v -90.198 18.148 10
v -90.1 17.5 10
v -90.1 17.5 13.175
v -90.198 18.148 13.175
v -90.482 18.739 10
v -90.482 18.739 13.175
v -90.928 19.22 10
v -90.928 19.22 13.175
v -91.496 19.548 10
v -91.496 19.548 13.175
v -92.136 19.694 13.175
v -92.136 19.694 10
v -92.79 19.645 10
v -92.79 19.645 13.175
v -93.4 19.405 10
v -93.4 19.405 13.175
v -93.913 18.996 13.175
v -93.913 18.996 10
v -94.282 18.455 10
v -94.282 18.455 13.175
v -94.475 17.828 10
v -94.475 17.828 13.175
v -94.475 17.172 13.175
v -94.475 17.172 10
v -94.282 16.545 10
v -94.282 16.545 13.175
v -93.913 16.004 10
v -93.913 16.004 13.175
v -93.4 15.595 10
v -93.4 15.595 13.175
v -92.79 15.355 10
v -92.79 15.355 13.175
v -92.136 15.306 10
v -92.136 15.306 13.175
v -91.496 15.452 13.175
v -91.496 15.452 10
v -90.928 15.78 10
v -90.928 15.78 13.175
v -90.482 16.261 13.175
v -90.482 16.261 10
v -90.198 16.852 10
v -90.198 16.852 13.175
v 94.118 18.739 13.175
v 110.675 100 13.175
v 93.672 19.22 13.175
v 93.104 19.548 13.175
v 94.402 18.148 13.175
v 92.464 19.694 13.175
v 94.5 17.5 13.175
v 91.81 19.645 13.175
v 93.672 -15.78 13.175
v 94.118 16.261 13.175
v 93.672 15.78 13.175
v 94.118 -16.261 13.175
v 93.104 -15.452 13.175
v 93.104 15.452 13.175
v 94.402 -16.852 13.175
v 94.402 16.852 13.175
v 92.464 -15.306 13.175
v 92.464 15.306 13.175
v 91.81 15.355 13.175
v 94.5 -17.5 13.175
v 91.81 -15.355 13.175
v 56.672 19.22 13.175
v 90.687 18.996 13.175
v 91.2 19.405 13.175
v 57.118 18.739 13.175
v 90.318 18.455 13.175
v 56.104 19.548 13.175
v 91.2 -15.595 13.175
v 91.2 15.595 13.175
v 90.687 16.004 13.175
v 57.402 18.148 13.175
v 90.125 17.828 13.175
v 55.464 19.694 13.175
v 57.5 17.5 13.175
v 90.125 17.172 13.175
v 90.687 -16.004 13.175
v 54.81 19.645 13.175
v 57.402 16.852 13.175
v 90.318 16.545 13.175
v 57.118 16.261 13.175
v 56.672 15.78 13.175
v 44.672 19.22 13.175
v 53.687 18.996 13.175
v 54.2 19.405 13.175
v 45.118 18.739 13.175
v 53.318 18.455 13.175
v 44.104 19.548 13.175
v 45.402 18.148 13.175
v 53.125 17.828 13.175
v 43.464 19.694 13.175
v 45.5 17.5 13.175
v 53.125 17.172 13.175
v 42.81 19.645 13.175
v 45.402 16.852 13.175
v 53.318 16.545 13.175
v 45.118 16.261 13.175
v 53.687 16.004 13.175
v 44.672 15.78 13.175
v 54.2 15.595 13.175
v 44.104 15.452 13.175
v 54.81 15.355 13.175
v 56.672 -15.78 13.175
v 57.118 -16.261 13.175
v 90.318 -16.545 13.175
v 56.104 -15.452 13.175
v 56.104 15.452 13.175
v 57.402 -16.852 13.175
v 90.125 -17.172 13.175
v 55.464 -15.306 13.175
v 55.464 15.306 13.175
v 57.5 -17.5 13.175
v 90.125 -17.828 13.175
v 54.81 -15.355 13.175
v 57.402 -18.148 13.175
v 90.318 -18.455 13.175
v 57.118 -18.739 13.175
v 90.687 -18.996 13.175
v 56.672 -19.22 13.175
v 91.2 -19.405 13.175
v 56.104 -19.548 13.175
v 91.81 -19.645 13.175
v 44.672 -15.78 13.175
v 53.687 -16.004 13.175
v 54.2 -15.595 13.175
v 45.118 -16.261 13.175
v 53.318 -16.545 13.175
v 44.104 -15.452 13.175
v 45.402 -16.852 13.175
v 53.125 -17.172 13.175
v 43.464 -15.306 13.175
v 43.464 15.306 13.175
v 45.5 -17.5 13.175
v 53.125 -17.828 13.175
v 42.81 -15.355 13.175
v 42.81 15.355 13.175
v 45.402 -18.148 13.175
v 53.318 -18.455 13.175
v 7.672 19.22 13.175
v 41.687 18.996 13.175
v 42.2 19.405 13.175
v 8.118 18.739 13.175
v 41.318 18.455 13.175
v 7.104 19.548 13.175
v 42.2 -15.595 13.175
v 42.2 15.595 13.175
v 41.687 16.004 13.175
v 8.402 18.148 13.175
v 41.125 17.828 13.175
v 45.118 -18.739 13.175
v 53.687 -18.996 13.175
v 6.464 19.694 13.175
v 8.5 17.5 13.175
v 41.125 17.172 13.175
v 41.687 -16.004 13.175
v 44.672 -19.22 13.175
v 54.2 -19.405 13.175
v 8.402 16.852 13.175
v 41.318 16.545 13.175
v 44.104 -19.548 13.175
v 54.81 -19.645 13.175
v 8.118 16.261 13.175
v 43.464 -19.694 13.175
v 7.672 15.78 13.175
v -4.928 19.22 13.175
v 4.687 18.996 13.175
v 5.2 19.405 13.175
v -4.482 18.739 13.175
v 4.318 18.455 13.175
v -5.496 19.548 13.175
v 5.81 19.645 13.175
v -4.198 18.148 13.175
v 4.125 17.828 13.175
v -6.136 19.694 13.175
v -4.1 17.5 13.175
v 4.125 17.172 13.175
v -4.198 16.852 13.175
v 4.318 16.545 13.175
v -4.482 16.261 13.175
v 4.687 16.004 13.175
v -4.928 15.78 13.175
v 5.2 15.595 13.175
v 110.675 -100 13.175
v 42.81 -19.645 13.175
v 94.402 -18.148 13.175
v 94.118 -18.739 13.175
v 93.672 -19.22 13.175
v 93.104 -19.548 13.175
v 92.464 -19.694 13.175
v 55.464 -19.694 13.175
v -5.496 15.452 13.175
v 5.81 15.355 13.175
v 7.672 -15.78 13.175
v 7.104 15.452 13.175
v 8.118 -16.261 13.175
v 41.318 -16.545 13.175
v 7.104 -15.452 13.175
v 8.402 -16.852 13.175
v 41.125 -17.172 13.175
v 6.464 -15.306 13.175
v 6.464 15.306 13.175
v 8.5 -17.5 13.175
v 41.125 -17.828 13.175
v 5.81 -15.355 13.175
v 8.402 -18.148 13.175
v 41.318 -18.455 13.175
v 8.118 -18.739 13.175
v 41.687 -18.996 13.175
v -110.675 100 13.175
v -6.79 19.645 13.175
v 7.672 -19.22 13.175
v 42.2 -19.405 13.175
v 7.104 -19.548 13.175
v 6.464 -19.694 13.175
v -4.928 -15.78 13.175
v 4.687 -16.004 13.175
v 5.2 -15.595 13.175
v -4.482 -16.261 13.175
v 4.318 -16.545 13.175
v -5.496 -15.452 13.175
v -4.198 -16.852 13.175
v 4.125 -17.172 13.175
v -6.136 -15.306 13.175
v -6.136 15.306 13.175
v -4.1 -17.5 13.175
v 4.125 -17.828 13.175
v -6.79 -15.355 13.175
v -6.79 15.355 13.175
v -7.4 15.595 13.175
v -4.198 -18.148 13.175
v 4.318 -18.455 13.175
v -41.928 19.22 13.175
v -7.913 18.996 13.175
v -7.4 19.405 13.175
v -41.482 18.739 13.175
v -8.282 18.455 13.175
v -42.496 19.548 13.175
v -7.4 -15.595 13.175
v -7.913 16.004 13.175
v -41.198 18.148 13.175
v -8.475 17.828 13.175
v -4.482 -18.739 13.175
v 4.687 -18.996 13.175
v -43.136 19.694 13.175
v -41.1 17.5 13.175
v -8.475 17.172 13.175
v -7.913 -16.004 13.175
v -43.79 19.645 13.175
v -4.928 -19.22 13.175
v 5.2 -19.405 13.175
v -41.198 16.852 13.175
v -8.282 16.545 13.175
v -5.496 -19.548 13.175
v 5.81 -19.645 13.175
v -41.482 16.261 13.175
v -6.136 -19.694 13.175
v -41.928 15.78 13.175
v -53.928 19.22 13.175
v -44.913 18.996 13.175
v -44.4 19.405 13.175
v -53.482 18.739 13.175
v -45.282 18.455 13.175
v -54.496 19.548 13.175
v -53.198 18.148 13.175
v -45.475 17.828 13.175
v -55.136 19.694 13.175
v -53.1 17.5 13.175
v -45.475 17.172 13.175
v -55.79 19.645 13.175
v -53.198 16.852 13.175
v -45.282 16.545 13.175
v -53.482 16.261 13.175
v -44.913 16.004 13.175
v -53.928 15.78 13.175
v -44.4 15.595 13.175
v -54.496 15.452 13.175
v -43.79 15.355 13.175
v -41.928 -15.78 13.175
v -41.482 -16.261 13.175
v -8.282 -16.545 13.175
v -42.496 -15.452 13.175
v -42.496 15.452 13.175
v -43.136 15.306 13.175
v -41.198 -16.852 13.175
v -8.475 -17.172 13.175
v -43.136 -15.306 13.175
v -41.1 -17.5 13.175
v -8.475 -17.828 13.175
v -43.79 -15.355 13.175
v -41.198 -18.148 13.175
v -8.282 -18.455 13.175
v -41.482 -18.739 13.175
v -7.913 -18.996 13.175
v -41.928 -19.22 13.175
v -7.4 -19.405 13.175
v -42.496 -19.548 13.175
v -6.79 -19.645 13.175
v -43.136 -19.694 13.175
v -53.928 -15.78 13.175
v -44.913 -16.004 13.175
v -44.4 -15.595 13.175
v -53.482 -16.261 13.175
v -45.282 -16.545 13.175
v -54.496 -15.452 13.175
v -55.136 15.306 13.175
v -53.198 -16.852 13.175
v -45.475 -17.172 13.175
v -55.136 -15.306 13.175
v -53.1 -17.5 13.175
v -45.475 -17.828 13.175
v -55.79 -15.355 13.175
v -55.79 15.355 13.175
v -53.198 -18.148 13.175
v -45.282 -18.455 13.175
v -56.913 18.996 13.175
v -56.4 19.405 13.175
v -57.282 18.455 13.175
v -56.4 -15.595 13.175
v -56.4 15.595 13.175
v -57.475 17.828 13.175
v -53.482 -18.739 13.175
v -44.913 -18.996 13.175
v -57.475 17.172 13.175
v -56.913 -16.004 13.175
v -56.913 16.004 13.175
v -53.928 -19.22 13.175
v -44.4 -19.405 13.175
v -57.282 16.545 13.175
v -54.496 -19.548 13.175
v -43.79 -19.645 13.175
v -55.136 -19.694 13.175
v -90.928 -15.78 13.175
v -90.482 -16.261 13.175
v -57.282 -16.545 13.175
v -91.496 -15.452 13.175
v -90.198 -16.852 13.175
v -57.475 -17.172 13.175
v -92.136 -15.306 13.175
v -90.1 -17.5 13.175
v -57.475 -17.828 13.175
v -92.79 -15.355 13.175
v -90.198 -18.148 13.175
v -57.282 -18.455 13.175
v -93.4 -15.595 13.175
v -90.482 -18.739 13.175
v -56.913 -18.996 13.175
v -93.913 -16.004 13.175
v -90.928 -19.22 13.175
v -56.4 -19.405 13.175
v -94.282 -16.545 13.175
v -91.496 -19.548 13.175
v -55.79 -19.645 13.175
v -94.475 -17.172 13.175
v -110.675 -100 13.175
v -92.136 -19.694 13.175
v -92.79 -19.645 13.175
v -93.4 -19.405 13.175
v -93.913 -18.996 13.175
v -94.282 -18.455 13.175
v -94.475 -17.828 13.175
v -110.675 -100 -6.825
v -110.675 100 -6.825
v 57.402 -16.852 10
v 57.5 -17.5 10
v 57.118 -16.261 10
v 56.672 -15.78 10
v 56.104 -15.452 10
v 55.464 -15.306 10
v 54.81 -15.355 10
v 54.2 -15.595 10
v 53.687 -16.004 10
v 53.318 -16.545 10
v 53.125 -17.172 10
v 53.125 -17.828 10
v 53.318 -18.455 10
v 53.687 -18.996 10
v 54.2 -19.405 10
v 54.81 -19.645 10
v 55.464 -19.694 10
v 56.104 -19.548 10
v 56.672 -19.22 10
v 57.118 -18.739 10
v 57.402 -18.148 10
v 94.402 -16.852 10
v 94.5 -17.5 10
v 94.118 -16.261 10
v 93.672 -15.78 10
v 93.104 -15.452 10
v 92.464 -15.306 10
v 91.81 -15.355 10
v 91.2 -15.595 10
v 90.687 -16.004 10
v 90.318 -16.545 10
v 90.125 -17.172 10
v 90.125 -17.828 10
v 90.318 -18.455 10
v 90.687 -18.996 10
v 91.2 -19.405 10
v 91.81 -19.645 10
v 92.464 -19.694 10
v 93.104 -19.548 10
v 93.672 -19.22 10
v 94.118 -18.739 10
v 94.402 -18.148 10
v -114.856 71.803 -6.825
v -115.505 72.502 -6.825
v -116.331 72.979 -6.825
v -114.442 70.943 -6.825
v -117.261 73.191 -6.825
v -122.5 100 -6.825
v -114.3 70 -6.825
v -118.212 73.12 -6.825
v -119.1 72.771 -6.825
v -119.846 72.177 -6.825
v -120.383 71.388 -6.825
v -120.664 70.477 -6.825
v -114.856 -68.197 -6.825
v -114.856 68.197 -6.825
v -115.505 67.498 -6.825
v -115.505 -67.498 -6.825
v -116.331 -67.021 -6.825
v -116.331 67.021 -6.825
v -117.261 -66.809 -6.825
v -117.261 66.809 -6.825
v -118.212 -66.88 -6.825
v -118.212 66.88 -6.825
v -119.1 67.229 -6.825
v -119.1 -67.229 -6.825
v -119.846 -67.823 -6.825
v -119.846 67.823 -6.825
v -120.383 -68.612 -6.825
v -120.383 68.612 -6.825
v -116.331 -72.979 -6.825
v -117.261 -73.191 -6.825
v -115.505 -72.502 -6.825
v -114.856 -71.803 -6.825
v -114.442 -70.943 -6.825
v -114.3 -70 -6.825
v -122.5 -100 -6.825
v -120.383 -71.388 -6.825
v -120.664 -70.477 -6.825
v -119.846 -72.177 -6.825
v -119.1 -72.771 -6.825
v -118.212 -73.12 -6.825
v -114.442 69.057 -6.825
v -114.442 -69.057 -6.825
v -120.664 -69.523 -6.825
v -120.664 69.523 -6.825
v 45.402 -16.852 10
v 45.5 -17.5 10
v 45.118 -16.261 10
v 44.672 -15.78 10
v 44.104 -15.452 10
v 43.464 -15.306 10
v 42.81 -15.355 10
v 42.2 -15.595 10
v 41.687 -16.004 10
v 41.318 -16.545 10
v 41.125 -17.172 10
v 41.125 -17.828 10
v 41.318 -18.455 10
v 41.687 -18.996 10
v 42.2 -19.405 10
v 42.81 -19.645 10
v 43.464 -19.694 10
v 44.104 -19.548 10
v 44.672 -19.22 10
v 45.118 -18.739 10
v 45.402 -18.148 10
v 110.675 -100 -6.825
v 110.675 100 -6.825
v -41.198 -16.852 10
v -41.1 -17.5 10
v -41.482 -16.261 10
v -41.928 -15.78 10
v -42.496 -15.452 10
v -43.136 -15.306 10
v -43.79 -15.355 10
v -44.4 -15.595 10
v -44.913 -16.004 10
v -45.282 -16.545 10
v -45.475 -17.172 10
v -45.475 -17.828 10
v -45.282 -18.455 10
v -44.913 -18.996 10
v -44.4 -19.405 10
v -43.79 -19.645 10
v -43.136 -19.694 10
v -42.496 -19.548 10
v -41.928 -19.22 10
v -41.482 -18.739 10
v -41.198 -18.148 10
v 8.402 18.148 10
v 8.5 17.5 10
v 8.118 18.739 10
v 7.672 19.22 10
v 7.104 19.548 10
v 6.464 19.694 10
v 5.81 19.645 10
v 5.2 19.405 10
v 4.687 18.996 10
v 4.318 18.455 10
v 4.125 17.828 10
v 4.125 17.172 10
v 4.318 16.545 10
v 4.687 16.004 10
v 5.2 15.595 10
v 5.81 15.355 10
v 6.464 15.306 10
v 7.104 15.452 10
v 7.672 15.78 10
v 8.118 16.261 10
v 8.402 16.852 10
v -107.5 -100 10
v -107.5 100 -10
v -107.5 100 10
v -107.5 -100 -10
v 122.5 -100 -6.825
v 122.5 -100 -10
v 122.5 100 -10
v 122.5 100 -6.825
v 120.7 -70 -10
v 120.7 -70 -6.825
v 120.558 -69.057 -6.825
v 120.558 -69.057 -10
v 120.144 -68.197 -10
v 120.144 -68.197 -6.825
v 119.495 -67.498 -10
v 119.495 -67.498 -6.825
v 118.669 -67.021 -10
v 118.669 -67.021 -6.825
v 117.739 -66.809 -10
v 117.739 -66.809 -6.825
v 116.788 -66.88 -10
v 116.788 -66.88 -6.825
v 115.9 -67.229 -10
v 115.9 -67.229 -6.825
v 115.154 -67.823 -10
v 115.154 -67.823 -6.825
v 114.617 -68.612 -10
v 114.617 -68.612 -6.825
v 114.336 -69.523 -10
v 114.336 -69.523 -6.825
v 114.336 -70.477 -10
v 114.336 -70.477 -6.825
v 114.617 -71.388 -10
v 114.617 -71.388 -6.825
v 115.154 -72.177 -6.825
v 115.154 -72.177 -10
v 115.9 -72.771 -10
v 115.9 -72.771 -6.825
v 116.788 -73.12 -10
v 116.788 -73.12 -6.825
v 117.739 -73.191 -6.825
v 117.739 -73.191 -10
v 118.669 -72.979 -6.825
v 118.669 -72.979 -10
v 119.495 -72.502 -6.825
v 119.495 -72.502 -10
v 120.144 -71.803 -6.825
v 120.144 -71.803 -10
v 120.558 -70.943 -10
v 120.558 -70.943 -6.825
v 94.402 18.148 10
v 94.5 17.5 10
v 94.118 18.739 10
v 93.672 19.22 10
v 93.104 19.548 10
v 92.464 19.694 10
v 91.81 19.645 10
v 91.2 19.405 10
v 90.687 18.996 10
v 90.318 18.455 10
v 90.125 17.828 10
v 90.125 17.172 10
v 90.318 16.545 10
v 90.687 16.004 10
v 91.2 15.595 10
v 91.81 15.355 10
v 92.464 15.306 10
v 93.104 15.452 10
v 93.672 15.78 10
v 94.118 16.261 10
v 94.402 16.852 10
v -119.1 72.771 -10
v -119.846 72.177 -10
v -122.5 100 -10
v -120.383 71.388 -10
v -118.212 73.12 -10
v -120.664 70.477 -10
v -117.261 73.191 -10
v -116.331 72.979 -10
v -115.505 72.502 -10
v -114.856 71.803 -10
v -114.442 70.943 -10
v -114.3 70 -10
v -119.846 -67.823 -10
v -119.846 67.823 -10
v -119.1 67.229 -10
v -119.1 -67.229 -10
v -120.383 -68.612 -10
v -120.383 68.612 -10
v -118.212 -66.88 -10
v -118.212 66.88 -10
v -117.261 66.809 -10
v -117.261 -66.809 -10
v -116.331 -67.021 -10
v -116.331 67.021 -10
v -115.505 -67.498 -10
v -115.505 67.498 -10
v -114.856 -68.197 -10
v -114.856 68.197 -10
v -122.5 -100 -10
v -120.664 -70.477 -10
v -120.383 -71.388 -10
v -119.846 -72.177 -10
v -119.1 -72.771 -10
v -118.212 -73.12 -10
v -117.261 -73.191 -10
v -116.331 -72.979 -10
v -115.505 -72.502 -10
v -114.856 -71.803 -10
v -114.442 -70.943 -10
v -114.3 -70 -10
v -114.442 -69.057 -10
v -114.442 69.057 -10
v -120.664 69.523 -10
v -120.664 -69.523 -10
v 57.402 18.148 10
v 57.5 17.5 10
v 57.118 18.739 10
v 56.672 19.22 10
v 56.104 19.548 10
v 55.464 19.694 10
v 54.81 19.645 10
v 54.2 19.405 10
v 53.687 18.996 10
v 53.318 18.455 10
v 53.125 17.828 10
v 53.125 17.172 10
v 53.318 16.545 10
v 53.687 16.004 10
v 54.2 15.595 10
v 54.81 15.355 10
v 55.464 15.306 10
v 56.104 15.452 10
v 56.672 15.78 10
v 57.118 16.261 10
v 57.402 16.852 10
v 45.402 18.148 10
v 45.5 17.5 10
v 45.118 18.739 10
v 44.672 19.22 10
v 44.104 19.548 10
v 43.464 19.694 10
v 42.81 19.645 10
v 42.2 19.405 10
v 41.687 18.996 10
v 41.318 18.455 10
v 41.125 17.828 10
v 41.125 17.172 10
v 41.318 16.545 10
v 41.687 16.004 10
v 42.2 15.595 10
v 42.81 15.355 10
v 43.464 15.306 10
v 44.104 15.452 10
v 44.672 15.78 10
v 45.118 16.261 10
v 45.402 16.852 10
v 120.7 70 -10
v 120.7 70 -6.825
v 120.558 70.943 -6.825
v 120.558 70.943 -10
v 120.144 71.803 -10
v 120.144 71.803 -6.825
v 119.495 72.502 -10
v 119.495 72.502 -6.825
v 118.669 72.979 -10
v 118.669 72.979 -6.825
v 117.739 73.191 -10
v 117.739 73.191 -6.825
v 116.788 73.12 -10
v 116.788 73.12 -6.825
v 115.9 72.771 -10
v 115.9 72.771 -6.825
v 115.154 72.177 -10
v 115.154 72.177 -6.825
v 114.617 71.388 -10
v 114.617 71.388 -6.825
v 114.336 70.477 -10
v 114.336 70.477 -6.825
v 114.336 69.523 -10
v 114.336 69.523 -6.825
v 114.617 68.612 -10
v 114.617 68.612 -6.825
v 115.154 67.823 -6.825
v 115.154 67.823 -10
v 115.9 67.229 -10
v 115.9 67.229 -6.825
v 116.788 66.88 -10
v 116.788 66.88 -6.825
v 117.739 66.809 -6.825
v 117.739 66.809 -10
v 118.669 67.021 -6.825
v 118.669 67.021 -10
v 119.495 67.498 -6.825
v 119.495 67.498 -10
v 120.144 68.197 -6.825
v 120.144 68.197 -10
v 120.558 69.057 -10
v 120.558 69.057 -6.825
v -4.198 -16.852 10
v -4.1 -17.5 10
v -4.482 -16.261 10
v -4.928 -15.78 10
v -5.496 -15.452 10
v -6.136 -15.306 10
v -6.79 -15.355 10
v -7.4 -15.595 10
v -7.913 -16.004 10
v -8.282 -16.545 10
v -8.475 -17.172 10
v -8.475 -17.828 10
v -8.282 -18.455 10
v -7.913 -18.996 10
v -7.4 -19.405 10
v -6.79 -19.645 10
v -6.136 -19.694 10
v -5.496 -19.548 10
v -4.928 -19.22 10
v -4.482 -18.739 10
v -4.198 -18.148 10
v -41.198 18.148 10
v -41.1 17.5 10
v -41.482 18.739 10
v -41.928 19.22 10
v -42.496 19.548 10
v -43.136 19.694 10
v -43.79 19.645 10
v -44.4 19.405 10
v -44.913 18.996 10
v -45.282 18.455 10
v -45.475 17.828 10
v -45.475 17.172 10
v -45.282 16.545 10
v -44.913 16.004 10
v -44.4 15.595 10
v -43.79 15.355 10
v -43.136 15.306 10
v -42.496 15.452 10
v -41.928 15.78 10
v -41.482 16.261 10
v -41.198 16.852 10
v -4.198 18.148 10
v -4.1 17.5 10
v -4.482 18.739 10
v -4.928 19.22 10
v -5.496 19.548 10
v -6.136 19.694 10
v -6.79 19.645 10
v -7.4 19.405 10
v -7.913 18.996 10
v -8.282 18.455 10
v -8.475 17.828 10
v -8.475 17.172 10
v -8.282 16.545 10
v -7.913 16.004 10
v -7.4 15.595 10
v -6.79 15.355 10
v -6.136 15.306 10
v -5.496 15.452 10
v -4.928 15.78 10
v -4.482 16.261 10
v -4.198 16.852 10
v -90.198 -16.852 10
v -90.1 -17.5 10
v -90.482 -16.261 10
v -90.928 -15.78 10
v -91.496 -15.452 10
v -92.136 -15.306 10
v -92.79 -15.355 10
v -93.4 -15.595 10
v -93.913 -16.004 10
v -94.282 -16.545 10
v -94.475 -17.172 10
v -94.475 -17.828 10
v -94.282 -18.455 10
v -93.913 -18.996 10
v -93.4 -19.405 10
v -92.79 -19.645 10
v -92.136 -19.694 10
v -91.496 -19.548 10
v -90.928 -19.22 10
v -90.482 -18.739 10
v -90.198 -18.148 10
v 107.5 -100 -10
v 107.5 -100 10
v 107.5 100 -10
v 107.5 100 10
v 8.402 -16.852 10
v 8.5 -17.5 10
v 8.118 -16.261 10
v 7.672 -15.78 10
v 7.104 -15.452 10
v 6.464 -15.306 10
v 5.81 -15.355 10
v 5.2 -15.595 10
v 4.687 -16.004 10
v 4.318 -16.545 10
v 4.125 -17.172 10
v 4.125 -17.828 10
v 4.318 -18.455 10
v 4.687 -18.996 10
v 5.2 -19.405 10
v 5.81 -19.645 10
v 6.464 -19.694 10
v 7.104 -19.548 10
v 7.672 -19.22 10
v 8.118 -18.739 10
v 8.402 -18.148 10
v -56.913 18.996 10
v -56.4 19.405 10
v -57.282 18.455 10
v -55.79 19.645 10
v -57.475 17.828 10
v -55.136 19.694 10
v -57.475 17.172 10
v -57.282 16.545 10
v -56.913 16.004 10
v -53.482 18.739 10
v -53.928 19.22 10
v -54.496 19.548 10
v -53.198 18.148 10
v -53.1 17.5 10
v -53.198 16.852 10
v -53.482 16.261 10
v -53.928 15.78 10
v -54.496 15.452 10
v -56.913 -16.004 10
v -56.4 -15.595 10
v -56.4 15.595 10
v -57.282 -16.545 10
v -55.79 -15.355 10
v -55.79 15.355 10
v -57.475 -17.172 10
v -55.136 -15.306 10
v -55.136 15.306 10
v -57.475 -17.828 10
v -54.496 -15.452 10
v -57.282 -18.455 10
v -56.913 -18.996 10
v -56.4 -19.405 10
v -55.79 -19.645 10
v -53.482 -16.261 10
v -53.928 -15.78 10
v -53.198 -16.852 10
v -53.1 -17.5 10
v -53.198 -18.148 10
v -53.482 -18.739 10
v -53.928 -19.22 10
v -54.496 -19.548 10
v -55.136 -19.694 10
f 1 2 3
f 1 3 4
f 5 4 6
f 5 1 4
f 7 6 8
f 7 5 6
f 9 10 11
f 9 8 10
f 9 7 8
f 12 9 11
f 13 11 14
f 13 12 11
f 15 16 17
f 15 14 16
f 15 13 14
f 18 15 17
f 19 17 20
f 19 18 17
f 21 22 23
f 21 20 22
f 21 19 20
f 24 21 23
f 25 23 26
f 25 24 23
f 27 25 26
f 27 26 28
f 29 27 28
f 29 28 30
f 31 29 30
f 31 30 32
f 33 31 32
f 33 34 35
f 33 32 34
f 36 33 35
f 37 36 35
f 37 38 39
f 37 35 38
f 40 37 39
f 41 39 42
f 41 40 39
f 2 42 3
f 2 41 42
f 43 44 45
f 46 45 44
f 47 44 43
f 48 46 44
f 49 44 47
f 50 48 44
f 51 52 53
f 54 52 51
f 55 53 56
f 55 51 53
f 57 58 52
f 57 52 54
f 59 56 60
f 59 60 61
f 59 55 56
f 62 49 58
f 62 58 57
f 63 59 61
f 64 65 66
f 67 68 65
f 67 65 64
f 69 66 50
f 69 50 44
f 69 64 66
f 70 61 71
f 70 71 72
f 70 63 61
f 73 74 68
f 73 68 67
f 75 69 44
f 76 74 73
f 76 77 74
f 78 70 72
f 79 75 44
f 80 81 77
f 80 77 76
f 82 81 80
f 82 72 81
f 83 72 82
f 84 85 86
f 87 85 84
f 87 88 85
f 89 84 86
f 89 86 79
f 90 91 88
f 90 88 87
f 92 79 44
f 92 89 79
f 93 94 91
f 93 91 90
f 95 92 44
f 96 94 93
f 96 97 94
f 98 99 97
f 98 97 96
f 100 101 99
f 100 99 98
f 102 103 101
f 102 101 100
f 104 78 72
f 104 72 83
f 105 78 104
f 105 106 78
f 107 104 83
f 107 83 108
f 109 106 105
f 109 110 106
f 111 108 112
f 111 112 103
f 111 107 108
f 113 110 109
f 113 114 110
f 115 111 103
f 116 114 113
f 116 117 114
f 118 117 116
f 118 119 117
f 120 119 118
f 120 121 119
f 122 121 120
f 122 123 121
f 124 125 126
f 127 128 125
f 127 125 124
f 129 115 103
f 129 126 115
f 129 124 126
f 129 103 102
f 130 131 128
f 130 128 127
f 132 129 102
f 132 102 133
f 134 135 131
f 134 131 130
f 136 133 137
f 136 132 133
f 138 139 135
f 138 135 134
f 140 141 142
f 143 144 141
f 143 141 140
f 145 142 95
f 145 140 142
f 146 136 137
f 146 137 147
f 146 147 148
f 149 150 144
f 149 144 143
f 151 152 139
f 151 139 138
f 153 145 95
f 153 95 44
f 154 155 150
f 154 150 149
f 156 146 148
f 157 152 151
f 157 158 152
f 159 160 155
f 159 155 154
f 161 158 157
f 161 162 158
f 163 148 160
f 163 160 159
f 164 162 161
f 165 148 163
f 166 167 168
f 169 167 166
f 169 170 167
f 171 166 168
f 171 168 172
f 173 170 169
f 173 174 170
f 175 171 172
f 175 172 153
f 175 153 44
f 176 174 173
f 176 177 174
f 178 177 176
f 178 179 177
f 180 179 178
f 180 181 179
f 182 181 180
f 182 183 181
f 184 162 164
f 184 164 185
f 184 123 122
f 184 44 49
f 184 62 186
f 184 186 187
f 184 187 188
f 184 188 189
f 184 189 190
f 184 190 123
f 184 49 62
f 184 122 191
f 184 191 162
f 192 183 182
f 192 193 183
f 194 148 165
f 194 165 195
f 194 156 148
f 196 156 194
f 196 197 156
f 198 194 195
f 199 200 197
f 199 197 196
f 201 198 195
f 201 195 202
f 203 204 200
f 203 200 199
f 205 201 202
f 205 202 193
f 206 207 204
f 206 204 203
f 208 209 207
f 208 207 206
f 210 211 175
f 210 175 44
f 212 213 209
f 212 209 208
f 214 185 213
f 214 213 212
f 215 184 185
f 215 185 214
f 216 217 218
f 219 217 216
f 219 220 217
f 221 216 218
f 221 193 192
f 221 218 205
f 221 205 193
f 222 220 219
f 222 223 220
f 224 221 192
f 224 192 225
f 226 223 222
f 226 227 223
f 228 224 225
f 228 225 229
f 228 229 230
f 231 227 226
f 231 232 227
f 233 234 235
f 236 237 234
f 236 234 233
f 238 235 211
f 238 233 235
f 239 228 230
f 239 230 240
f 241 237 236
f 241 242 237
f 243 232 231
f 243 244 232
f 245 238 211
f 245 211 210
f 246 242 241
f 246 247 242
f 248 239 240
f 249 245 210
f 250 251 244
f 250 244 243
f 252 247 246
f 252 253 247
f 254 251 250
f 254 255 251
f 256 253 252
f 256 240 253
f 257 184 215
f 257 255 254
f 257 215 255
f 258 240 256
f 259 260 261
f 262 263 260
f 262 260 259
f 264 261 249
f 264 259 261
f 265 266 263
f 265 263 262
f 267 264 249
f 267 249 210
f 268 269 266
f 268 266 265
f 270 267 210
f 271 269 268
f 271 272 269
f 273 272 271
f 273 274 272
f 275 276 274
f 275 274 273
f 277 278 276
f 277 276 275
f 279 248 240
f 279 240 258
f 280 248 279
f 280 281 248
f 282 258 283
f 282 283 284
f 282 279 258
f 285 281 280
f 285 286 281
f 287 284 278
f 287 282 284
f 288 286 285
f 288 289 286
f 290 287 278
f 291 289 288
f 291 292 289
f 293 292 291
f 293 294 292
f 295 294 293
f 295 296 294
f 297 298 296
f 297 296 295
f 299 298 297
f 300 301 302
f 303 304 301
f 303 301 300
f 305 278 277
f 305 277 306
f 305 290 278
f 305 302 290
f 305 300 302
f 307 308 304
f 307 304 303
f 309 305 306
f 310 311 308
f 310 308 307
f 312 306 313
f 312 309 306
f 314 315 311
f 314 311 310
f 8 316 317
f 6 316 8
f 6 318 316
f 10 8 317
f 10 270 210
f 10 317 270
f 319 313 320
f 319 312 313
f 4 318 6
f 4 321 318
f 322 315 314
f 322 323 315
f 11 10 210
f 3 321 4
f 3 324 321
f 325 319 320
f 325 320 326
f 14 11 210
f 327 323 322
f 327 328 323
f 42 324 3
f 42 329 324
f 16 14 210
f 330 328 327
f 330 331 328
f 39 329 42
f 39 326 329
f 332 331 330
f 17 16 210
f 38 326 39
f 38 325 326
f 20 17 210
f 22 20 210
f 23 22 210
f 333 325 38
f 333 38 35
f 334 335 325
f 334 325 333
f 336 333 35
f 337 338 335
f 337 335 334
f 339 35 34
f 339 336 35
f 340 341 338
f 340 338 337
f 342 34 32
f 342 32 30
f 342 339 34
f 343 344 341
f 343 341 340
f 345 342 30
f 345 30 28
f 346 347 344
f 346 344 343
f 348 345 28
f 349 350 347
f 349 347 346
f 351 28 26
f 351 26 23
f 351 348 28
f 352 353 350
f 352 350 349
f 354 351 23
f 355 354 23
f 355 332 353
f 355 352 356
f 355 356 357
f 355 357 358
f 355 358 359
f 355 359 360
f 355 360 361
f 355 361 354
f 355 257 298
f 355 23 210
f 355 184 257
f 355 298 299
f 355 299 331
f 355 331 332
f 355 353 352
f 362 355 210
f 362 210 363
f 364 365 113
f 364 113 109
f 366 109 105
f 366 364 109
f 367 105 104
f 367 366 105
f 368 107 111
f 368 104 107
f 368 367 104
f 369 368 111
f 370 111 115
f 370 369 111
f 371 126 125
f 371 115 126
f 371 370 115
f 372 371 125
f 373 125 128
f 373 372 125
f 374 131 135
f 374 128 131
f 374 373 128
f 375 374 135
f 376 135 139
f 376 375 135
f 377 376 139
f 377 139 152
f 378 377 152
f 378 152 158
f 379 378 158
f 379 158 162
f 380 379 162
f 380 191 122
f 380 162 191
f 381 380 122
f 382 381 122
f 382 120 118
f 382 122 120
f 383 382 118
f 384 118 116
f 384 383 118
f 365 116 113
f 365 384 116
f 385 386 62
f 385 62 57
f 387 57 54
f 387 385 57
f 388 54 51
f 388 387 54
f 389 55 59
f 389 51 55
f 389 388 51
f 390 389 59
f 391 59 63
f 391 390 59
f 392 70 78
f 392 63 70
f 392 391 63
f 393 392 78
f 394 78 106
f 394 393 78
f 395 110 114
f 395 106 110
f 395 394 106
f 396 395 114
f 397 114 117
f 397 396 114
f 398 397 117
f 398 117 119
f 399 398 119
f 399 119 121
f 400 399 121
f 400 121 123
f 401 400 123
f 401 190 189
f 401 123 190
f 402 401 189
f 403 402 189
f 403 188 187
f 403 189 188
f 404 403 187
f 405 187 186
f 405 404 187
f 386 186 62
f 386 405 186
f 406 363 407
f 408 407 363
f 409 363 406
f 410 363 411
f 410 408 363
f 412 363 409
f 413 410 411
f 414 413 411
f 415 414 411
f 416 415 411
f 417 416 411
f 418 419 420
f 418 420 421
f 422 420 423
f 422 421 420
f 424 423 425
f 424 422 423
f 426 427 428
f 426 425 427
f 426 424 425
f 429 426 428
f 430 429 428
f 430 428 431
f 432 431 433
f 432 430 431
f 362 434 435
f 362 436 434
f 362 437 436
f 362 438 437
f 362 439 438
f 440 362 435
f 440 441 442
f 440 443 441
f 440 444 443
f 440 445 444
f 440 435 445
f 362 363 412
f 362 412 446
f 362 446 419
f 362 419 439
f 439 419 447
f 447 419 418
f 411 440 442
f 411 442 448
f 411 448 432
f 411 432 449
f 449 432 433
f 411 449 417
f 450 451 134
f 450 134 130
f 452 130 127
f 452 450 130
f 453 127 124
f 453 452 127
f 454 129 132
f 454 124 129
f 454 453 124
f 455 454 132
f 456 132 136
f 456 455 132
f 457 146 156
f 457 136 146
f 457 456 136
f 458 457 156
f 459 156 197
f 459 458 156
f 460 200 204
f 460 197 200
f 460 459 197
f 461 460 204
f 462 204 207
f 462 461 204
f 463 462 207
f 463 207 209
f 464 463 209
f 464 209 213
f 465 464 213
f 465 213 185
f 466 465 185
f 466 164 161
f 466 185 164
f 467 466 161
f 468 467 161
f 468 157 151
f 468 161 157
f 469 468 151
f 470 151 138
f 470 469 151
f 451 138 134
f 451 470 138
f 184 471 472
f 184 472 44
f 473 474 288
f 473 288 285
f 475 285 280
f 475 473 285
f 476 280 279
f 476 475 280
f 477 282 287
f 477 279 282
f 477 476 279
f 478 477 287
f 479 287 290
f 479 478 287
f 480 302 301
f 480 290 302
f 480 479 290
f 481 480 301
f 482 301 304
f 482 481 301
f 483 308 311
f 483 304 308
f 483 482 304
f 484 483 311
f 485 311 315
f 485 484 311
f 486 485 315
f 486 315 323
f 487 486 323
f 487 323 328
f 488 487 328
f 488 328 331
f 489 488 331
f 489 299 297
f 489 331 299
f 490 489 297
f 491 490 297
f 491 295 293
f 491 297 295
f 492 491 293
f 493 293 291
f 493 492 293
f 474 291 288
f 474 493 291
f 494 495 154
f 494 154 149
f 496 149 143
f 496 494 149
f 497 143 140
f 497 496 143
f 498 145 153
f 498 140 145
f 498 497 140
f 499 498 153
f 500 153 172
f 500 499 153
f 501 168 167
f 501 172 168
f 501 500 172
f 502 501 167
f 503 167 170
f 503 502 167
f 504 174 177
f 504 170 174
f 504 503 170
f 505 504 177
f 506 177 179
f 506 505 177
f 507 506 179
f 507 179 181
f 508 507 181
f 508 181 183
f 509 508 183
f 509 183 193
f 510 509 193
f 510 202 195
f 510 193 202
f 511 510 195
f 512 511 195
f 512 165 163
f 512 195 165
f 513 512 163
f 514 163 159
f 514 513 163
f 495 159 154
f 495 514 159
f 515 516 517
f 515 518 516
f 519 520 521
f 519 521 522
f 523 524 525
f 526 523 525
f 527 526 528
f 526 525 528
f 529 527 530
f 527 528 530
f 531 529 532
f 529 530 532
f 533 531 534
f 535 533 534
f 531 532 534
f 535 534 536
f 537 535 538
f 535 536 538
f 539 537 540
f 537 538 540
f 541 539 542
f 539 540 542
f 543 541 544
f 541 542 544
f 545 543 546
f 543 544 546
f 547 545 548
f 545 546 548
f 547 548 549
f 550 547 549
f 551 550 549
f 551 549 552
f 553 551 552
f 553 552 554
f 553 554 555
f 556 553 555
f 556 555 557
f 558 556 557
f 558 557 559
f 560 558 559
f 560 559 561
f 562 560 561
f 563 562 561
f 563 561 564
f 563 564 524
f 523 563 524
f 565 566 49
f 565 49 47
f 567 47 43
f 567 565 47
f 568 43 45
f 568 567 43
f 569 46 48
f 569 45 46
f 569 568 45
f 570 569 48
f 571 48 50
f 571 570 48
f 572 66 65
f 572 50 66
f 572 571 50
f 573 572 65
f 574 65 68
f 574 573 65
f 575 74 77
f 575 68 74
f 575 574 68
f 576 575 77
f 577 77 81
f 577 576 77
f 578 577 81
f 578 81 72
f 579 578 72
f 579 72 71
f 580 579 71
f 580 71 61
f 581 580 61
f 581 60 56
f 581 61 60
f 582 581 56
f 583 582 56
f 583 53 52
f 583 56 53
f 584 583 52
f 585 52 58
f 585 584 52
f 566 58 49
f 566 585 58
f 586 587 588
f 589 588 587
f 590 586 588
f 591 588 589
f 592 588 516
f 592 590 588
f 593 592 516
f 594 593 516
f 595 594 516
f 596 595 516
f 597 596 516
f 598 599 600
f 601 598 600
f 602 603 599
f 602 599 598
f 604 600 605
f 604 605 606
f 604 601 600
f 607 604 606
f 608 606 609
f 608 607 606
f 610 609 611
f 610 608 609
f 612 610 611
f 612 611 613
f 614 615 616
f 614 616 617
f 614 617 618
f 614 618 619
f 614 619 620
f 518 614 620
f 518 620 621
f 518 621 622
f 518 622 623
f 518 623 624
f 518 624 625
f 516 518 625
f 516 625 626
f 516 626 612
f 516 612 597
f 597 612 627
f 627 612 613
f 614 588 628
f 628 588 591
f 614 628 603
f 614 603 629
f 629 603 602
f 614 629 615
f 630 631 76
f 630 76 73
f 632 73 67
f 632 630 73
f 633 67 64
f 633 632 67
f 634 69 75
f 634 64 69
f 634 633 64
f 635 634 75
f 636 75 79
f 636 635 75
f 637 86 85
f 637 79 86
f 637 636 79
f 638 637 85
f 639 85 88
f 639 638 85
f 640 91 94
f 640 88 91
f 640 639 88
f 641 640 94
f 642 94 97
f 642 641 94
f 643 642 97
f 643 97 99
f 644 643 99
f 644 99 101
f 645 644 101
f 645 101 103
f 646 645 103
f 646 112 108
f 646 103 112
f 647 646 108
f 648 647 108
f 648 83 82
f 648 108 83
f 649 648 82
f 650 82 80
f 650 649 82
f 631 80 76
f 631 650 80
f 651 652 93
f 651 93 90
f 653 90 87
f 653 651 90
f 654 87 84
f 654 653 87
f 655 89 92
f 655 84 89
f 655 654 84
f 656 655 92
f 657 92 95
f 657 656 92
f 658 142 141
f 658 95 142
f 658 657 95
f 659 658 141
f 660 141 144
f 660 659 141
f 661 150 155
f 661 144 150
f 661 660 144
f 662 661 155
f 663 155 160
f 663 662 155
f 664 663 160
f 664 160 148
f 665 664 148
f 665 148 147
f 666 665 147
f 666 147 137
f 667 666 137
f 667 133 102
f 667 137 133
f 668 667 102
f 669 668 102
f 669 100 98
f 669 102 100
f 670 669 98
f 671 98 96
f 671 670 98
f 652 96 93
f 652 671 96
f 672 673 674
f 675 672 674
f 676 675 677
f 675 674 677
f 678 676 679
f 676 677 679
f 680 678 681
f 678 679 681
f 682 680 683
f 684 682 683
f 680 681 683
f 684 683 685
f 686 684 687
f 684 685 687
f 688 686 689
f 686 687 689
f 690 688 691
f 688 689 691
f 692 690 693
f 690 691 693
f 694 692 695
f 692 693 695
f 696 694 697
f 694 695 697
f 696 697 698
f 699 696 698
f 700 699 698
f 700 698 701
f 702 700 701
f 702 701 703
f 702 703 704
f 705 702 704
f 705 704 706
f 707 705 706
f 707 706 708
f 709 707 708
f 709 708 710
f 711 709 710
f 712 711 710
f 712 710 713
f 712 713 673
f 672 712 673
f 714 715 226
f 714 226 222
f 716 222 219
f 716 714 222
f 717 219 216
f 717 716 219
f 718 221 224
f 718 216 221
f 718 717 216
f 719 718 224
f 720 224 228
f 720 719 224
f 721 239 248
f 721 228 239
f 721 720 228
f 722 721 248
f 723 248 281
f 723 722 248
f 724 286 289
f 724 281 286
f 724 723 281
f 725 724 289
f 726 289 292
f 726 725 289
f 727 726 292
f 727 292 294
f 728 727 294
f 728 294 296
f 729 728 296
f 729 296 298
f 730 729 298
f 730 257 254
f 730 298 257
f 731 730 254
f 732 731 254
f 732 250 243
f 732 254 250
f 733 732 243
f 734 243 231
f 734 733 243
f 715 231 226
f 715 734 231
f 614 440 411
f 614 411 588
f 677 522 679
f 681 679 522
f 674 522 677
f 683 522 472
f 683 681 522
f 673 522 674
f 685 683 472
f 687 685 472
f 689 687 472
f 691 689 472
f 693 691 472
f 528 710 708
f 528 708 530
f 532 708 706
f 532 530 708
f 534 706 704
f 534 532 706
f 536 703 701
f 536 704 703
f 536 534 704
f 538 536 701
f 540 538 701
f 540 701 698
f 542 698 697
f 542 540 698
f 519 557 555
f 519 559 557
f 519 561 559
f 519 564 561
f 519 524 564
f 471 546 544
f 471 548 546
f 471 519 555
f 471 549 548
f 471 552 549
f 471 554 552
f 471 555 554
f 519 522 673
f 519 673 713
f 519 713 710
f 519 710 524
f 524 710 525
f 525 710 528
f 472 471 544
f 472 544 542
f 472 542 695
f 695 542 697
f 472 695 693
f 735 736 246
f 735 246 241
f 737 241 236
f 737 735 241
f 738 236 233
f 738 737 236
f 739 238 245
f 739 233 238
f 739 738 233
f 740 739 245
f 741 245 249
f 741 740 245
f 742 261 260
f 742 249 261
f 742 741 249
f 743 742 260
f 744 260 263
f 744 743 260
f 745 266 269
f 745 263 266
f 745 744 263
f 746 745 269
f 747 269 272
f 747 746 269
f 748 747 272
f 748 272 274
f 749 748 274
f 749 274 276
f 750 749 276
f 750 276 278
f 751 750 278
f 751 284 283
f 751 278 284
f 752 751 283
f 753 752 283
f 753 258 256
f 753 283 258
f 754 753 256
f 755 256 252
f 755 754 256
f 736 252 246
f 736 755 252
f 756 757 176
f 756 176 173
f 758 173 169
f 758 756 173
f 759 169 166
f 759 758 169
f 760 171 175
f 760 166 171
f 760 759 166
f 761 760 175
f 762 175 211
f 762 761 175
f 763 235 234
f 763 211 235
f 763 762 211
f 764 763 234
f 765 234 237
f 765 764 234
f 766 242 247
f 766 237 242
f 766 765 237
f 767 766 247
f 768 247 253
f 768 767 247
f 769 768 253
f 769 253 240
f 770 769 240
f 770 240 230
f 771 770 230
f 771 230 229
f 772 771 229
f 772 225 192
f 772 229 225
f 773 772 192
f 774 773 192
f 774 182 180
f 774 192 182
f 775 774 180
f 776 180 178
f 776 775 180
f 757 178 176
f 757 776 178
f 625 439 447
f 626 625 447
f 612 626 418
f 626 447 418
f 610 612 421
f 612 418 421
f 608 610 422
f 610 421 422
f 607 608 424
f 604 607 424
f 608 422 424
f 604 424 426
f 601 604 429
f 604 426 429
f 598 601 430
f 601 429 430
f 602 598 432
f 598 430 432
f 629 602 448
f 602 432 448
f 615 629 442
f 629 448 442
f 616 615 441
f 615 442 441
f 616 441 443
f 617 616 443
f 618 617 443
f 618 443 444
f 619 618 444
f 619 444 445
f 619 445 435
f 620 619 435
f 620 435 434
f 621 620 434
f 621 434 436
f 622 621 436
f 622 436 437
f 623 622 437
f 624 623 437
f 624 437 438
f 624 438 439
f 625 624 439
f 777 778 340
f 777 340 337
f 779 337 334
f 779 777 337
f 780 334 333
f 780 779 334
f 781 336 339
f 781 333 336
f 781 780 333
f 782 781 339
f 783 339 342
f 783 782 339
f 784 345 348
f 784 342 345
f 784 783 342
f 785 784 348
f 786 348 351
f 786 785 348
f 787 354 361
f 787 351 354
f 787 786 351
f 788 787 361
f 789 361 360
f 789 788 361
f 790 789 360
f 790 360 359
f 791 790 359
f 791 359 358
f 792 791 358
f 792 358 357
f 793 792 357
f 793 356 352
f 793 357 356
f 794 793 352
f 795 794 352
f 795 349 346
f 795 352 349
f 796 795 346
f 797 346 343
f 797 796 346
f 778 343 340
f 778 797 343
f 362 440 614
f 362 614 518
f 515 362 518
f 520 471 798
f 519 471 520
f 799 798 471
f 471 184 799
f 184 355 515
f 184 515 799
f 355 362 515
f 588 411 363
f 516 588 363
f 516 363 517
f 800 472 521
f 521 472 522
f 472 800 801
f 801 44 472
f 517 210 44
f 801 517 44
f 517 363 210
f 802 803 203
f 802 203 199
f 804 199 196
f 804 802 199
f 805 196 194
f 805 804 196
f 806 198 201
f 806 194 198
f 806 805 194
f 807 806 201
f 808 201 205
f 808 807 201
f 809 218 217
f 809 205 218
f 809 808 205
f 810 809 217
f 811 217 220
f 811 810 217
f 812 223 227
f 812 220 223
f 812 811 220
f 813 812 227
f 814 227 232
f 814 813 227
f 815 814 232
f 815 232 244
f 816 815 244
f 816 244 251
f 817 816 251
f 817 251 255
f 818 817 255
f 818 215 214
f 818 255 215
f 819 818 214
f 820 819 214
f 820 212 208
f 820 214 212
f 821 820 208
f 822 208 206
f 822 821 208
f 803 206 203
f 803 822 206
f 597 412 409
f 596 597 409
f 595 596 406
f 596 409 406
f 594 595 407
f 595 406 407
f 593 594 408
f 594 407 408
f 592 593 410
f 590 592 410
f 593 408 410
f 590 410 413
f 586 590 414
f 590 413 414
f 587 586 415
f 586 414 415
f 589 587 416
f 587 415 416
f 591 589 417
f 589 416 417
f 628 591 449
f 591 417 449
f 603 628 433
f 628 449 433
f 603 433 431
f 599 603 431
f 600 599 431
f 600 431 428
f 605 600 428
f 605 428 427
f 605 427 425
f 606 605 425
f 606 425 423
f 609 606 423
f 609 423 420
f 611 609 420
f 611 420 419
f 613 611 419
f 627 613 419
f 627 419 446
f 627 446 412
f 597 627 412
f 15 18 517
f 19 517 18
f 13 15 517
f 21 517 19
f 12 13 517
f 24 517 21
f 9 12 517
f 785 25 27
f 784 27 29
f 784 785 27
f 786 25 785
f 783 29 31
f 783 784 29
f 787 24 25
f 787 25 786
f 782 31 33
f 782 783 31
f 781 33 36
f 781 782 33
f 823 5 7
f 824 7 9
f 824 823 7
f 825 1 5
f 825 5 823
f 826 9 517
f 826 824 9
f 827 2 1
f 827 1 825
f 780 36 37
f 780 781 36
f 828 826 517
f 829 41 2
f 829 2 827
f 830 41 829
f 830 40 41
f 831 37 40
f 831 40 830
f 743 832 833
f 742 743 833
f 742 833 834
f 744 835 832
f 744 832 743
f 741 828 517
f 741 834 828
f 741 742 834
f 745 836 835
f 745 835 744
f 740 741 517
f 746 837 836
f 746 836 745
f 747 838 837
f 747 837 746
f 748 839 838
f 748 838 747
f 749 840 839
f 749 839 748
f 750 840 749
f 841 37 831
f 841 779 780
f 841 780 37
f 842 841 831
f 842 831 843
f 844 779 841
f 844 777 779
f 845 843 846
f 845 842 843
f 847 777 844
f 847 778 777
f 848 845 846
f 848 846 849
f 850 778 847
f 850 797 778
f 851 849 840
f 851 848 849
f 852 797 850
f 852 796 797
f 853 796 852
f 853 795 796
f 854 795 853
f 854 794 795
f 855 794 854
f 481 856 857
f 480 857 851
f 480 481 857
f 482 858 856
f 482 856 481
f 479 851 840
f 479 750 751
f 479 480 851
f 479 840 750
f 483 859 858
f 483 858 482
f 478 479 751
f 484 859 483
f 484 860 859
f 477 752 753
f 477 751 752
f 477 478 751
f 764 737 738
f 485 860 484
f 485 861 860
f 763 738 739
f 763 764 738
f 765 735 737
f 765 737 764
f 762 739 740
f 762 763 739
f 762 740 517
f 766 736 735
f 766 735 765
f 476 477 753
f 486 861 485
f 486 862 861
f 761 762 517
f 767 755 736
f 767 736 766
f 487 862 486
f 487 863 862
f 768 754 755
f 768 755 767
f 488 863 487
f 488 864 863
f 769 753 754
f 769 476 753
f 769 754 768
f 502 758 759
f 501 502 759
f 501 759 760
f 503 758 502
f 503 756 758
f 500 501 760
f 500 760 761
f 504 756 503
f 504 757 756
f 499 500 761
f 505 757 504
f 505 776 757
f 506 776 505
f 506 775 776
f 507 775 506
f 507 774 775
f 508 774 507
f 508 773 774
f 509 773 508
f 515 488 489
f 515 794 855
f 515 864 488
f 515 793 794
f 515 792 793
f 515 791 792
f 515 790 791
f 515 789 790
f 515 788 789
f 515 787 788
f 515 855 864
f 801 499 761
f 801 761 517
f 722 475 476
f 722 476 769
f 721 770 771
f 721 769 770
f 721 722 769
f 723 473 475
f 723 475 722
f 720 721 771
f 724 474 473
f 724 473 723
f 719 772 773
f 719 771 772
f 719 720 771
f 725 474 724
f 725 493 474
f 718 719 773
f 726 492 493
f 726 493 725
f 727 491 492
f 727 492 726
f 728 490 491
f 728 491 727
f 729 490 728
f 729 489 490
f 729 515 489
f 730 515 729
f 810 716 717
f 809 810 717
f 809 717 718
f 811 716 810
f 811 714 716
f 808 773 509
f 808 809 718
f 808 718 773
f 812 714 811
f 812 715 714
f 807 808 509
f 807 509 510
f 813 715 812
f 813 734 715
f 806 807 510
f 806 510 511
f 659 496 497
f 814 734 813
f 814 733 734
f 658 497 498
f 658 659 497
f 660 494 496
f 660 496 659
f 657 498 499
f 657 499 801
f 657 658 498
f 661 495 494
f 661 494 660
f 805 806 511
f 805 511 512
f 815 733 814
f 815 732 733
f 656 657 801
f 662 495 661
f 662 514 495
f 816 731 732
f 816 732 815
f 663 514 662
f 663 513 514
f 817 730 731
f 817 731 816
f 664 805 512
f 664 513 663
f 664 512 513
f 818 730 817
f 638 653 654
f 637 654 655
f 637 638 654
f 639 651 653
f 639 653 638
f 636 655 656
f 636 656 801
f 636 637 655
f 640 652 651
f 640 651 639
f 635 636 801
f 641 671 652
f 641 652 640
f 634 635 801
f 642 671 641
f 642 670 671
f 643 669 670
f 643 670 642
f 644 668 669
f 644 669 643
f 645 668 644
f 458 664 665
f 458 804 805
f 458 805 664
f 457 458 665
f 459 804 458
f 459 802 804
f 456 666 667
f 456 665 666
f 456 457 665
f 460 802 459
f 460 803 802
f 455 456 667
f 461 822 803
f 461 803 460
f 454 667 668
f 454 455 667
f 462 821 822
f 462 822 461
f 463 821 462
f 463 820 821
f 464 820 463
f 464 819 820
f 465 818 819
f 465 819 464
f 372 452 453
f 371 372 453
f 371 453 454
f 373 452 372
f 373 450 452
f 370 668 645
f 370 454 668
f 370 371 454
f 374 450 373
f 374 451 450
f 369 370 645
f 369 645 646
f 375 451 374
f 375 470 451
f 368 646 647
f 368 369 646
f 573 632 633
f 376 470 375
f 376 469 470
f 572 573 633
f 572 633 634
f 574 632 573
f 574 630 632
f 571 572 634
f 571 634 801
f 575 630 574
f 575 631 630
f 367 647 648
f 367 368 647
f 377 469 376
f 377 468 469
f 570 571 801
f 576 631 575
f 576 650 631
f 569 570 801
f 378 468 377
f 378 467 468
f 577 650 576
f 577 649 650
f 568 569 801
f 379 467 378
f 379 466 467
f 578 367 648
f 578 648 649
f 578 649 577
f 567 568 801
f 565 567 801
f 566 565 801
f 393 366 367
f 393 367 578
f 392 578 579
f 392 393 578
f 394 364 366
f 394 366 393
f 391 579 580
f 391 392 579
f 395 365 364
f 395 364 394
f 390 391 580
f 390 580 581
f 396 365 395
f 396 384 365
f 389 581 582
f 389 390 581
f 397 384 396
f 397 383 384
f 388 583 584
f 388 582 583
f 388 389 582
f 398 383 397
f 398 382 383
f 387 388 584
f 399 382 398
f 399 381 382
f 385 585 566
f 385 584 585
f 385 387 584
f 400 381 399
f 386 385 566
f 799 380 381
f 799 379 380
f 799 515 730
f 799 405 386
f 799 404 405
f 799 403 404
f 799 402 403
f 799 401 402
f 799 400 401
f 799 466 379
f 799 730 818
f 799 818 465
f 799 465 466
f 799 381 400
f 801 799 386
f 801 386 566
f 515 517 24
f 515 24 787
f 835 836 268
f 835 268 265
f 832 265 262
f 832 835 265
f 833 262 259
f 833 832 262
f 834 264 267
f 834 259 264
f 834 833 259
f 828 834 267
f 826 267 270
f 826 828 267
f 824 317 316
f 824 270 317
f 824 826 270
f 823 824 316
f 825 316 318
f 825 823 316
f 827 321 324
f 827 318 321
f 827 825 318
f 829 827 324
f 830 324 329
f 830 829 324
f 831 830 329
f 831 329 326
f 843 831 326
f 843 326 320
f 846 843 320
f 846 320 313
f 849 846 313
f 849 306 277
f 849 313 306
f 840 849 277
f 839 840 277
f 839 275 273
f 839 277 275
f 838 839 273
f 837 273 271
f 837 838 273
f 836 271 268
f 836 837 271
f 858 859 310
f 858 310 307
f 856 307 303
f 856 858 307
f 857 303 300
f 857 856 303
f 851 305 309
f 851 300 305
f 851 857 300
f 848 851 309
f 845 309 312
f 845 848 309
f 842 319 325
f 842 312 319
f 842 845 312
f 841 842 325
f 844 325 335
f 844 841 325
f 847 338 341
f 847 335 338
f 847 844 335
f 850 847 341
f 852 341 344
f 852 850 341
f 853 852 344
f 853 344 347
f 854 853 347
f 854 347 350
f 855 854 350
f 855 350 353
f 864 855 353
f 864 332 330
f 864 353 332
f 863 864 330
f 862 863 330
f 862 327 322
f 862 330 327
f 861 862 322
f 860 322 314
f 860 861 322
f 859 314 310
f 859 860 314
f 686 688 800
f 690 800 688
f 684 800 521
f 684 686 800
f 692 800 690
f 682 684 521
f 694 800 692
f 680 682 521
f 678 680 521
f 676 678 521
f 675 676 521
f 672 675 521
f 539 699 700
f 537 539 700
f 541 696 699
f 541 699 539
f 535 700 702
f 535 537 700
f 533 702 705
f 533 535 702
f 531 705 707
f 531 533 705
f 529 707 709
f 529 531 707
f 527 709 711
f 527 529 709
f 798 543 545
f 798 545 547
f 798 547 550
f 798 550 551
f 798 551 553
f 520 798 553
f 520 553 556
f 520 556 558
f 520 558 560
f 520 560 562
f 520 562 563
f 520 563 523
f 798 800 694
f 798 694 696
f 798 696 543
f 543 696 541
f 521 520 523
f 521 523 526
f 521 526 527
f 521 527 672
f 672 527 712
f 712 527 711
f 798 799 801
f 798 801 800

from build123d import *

# Parameters (mm, degrees)
F1_DEPTH      = 100
F2_R          = 3.2
F2_R_2        = 2.2
F3_DEPTH      = 10.001
F3_DEPTH_BACK = 13.176


with BuildPart() as f1:
    # F0 (on Front) → F1 (new body, symmetric)
    with BuildSketch(Plane.XZ):
        Polygon((-107.5, 10), (107.5, 10), (107.5, -10), (122.5, -10), (122.5, -6.825), (110.675, -6.825), (110.675, 13.175), (-110.675, 13.175), (-110.675, -6.825), (-122.5, -6.825), (-122.5, -10), (-107.5, -10), align=None)
    extrude(amount=F1_DEPTH, both=True)

    # F2 (on Top) → F3 (cut, two sides)
    with BuildSketch(Plane.XY) as f3_sk:
        with Locations((-117.5, -70)):
            Circle(F2_R)
        with Locations((-92.3, -17.5)):
            Circle(F2_R_2)
        with Locations((-55.3, -17.5)):
            Circle(F2_R_2)
        with Locations((-43.3, -17.5)):
            Circle(F2_R_2)
        with Locations((-6.3, -17.5)):
            Circle(F2_R_2)
        with Locations((6.3, -17.5)):
            Circle(F2_R_2)
        with Locations((43.3, -17.5)):
            Circle(F2_R_2)
        with Locations((55.3, -17.5)):
            Circle(F2_R_2)
        with Locations((92.3, -17.5)):
            Circle(F2_R_2)
        with Locations((117.5, -70)):
            Circle(F2_R)
        with Locations((-92.3, 17.5)):
            Circle(F2_R_2)
        with Locations((43.3, 17.5)):
            Circle(F2_R_2)
        with Locations((55.3, 17.5)):
            Circle(F2_R_2)
        with Locations((6.3, 17.5)):
            Circle(F2_R_2)
        with Locations((-6.3, 17.5)):
            Circle(F2_R_2)
        with Locations((-43.3, 17.5)):
            Circle(F2_R_2)
        with Locations((92.3, 17.5)):
            Circle(F2_R_2)
        with Locations((-55.3, 17.5)):
            Circle(F2_R_2)
        with Locations((-117.5, 70)):
            Circle(F2_R)
        with Locations((117.5, 70)):
            Circle(F2_R)
    extrude(amount=-F3_DEPTH, mode=Mode.SUBTRACT)
    extrude(f3_sk.sketch, amount=F3_DEPTH_BACK, mode=Mode.SUBTRACT)


solid = f1.part
